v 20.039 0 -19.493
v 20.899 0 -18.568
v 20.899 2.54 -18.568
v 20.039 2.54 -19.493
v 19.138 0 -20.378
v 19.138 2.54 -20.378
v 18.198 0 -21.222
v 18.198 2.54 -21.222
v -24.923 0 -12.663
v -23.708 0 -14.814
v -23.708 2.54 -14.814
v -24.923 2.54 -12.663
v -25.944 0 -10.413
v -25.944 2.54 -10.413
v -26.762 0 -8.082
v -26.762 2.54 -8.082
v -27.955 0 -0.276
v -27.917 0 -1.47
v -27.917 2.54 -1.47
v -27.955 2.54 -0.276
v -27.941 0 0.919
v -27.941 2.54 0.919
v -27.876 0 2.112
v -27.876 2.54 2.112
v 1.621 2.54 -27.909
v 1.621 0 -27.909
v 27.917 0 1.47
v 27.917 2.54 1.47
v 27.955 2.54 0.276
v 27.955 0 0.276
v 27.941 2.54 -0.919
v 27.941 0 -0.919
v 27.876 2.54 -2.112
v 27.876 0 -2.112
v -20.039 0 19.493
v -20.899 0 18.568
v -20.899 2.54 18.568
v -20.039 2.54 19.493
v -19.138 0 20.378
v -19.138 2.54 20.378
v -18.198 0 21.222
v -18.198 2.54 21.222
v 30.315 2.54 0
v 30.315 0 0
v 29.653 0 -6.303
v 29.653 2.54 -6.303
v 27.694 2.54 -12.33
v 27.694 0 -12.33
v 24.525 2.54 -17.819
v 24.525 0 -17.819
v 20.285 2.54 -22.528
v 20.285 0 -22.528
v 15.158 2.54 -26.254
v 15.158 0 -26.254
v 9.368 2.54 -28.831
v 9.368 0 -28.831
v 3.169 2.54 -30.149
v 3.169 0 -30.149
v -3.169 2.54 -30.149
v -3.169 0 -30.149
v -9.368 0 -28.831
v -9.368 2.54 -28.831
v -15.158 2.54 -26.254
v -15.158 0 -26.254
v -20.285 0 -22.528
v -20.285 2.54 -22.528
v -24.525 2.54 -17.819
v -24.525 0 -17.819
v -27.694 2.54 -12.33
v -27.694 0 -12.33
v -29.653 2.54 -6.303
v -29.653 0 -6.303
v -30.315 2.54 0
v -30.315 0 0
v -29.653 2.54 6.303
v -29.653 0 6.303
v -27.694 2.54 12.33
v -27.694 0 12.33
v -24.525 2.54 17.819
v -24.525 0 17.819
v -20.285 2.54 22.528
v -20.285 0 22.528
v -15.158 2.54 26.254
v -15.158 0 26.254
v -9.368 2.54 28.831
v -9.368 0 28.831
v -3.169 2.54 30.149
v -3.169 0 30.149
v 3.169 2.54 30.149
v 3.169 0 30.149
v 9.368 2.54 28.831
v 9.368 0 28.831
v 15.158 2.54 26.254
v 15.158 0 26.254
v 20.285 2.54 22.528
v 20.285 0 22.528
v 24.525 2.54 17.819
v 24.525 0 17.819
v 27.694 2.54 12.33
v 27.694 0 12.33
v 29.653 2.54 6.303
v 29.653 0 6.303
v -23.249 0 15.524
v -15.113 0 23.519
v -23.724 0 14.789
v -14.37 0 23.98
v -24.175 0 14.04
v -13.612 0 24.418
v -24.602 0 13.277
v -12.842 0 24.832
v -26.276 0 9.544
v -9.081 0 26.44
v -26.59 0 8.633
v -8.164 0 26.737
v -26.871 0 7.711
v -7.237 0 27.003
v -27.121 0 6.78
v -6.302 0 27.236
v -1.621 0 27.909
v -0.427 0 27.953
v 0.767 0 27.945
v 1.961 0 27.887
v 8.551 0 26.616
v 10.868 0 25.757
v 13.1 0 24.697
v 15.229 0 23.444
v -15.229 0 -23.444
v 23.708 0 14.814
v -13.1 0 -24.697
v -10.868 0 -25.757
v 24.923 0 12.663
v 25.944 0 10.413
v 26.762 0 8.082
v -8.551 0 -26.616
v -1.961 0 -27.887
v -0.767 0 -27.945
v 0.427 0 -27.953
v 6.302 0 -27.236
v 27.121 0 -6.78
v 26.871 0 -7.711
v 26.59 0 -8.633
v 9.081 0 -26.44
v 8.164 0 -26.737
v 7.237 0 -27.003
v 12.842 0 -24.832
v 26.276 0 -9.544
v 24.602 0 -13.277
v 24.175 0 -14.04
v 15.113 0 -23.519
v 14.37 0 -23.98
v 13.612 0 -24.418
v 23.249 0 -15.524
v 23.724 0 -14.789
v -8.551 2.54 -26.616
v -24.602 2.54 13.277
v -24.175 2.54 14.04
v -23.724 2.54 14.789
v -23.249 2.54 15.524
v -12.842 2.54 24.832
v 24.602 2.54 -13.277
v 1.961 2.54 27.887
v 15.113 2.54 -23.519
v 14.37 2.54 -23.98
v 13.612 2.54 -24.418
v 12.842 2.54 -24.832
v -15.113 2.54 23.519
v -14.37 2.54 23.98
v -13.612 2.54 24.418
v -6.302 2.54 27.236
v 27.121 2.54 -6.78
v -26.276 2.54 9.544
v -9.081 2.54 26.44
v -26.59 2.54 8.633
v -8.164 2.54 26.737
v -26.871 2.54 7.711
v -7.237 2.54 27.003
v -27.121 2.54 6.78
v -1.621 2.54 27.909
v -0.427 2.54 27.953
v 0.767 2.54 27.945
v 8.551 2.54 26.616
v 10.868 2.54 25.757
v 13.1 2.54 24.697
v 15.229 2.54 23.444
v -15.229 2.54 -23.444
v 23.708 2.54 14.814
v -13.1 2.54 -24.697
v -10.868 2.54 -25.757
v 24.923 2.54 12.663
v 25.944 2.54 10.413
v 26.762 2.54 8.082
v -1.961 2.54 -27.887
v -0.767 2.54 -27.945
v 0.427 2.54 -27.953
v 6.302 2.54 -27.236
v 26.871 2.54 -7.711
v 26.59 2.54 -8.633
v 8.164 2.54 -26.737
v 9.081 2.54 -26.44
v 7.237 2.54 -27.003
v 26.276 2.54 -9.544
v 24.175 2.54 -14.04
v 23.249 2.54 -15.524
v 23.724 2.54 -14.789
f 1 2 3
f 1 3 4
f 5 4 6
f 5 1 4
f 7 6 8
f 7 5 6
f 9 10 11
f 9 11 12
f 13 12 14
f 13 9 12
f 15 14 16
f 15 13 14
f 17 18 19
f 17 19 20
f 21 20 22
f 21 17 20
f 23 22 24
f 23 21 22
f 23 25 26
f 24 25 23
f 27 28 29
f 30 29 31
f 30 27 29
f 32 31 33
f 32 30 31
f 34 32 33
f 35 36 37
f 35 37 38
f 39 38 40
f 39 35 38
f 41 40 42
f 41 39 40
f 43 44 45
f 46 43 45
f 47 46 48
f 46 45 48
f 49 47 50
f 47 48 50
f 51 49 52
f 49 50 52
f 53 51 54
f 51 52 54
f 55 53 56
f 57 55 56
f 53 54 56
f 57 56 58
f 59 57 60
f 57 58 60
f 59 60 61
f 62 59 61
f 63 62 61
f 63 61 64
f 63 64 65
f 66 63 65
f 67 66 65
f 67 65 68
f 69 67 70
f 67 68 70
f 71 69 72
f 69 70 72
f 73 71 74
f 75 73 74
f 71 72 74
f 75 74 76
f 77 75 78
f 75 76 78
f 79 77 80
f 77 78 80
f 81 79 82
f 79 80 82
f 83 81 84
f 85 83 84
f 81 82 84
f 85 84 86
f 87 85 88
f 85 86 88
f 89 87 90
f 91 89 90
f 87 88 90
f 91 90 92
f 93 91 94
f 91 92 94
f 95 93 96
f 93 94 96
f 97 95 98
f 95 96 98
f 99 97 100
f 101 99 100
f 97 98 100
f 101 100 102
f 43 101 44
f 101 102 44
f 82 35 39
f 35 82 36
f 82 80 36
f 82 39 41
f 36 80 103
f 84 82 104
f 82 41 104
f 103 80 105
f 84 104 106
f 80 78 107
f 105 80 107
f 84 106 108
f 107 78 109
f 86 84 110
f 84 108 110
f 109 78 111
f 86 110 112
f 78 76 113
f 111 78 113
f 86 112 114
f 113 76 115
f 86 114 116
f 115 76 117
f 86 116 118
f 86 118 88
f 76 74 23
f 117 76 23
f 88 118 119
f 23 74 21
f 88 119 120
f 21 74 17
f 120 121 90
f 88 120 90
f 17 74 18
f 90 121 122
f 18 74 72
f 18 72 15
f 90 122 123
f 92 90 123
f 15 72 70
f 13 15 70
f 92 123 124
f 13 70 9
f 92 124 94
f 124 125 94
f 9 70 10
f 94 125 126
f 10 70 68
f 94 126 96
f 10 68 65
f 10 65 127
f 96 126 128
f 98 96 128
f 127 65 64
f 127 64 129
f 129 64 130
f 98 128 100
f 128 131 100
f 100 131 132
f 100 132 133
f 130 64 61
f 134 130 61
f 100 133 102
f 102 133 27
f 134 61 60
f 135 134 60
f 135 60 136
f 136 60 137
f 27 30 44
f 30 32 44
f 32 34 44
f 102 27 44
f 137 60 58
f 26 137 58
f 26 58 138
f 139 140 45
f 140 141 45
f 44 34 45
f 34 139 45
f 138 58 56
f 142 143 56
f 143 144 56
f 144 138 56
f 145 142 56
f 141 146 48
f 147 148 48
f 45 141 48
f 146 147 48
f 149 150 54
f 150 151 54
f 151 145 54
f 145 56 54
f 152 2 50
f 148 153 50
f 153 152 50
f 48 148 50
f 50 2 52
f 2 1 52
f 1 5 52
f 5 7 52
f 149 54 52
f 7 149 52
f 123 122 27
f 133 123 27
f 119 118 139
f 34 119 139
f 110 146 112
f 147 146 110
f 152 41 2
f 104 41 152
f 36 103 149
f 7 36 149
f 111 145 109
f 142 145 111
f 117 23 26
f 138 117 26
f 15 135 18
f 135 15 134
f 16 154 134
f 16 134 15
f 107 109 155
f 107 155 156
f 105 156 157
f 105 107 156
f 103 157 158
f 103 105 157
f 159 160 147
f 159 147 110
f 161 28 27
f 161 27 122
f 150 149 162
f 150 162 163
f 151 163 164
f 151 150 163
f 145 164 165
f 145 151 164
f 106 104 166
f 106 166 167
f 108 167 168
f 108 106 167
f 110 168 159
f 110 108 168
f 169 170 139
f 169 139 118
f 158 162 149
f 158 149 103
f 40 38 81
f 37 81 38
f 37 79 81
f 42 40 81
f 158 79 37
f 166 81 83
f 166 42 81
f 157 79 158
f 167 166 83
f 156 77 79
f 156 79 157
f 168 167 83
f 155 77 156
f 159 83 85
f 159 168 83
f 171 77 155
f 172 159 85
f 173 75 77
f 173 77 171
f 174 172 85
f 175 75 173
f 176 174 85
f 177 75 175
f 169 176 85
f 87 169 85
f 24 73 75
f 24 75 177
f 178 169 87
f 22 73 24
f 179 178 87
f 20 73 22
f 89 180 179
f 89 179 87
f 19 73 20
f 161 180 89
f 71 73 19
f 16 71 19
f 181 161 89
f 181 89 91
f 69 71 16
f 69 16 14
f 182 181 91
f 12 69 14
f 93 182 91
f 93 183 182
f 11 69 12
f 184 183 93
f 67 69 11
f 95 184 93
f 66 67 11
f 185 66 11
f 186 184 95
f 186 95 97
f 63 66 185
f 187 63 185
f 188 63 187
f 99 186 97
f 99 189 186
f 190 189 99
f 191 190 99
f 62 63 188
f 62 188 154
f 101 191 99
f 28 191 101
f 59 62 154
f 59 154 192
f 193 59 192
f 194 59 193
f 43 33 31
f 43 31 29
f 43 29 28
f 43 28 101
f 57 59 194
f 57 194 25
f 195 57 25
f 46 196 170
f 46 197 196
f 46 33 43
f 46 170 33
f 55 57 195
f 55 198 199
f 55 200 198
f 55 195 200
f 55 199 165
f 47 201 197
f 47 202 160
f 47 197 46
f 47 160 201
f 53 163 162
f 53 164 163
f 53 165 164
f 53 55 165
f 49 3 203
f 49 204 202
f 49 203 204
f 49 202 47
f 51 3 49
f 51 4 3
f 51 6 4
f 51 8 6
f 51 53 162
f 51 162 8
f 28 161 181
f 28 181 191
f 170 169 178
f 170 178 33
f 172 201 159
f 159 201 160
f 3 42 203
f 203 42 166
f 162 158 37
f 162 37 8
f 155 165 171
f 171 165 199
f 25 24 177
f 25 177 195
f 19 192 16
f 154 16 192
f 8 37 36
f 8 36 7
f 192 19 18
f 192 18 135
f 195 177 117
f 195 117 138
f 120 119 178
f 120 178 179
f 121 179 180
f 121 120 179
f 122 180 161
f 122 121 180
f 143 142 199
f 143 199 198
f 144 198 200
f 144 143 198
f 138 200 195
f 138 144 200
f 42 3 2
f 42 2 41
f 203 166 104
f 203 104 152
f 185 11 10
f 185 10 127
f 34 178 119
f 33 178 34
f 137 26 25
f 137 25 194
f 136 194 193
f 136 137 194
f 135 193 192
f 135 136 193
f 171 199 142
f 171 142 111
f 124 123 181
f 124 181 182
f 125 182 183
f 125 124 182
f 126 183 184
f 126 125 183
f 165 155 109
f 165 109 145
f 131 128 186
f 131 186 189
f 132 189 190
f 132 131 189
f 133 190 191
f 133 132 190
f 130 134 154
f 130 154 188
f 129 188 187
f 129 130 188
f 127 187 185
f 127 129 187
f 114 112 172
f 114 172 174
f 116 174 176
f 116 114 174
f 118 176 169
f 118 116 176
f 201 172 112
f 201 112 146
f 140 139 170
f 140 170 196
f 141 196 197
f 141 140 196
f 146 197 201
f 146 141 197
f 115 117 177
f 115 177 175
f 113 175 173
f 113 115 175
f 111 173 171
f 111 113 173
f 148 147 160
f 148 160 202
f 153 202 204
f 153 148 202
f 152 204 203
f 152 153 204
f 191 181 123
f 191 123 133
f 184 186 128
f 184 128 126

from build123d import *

# Parameters (mm, degrees)
SKETCH1_R           = 30.315
SKETCH1_R_2         = 27.955876632
BOSS_EXTRUDE1_DEPTH = 2.54
BOSS_EXTRUDE3_DEPTH = 2.54


with BuildPart() as part:
    # Sketch1 → Boss-Extrude1 (new body)
    with BuildSketch(Plane(origin=(0, 0, 0), x_dir=(1, 0, 0), z_dir=(0, 1, 0))):
        Circle(SKETCH1_R)
        Circle(SKETCH1_R_2, mode=Mode.SUBTRACT)
    extrude(amount=BOSS_EXTRUDE1_DEPTH)

    # Sketch2 → Boss-Extrude3 (add)
    with BuildSketch(Plane(origin=(0, 2.54, 0), x_dir=(1, 0, 0), z_dir=(0, 1, 0))):
        with BuildLine():
            ThreePointArc((23.249475333, 15.523947146), (22.126610026, 17.086373723), (20.89893406, 18.567864536))
            Line((20.89893406, 18.567864536), (-18.197502423, -21.222204028))
            ThreePointArc((-18.197502423, -21.222204028), (-16.694652957, -22.423639332), (-15.112723253, -23.51885699))
            Line((-15.112723253, -23.51885699), (23.249475333, 15.523947146))
        make_face()
        with BuildLine():
            ThreePointArc((26.276234192, 9.544137201), (25.507547042, 11.440982568), (24.602142837, 13.276505792))
            Line((24.602142837, 13.276505792), (-12.841843795, -24.831795871))
            ThreePointArc((-12.841843795, -24.831795871), (-10.990683551, -25.70478386), (-9.080614707, -26.439997632))
            Line((-9.080614707, -26.439997632), (26.276234192, 9.544137201))
        make_face()
        with BuildLine():
            ThreePointArc((27.875984112, 2.112000943), (27.597491722, 4.462005025), (27.121248921, 6.780036517))
            Line((27.121248921, 6.780036517), (-6.302082474, -27.236277181))
            ThreePointArc((-6.302082474, -27.236277181), (-3.97603503, -27.671685595), (-1.621497222, -27.908811959))
            Line((-1.621497222, -27.908811959), (27.875984112, 2.112000943))
        make_face()
        with BuildLine():
            ThreePointArc((26.762200244, -8.081811449), (27.538835575, -4.810776795), (27.917192699, -1.470166667))
            Line((27.917192699, -1.470166667), (1.960841153, -27.887024584))
            ThreePointArc((1.960841153, -27.887024584), (5.294281665, -27.449983968), (8.551154051, -26.615950154))
            Line((8.551154051, -26.615950154), (26.762200244, -8.081811449))
        make_face()
        with BuildLine():
            ThreePointArc((15.229009426, -23.443726455), (19.940833039, -19.593218621), (23.707891831, -14.814415383))
            Line((23.707891831, -14.814415383), (15.229009426, -23.443726455))
        make_face()
        with BuildLine():
            ThreePointArc((16.305164724, 22.708426665), (15.714169419, 23.121330362), (15.112723252, 23.518856991))
            Line((15.112723252, 23.518856991), (-23.249475334, -15.523947145))
            ThreePointArc((-23.249475334, -15.523947145), (-22.982270651, -15.916855029), (-22.708426665, -16.305164724))
            ThreePointArc((-22.708426665, -16.305164724), (-22.41820217, -16.701953471), (-22.121045331, -17.0935775))
            ThreePointArc((-22.121045331, -17.0935775), (-21.522616878, -17.841188329), (-20.898934061, -18.567864535))
            Line((-20.898934061, -18.567864535), (18.197502422, 21.222204029))
            ThreePointArc((18.197502422, 21.222204029), (17.651262262, 21.678652606), (17.0935775, 22.121045331))
            ThreePointArc((17.0935775, 22.121045331), (16.701953471, 22.41820217), (16.305164724, 22.708426665))
        make_face()
        with BuildLine():
            ThreePointArc((12.841843795, 24.831795872), (10.99068355, 25.704783861), (9.080614706, 26.439997633))
            Line((9.080614706, 26.439997633), (-26.276234193, -9.544137201))
            ThreePointArc((-26.276234193, -9.544137201), (-25.507547043, -11.440982567), (-24.602142838, -13.276505791))
            Line((-24.602142838, -13.276505791), (12.841843795, 24.831795872))
        make_face()
        with BuildLine():
            ThreePointArc((3.386258142, 27.750032325), (2.505135962, 27.843407336), (1.621497221, 27.90881196))
            Line((1.621497221, 27.90881196), (-27.875984113, -2.112000942))
            ThreePointArc((-27.875984113, -2.112000942), (-27.820304798, -2.74985076), (-27.750032325, -3.386258142))
            ThreePointArc((-27.750032325, -3.386258142), (-27.488066672, -5.092860582), (-27.121248922, -6.780036516))
            Line((-27.121248922, -6.780036516), (6.302082473, 27.236277182))
            ThreePointArc((6.302082473, 27.236277182), (4.850976402, 27.531782837), (3.386258142, 27.750032325))
        make_face()
        with BuildLine():
            Line((-27.9171927, 1.470166667), (-1.960841154, 27.887024585))
            ThreePointArc((-1.960841154, 27.887024585), (-5.294281666, 27.449983969), (-8.551154052, 26.615950155))
            Line((-8.551154052, 26.615950155), (-26.762200245, 8.08181145))
            ThreePointArc((-26.762200245, 8.08181145), (-27.538835576, 4.810776796), (-27.9171927, 1.470166667))
        make_face()
        with BuildLine():
            Line((-23.707891832, 14.814415383), (-15.229009427, 23.443726455))
            ThreePointArc((-15.229009427, 23.443726455), (-19.940833039, 19.593218621), (-23.707891832, 14.814415383))
        make_face()
    extrude(amount=-BOSS_EXTRUDE3_DEPTH)


solid = part.part
